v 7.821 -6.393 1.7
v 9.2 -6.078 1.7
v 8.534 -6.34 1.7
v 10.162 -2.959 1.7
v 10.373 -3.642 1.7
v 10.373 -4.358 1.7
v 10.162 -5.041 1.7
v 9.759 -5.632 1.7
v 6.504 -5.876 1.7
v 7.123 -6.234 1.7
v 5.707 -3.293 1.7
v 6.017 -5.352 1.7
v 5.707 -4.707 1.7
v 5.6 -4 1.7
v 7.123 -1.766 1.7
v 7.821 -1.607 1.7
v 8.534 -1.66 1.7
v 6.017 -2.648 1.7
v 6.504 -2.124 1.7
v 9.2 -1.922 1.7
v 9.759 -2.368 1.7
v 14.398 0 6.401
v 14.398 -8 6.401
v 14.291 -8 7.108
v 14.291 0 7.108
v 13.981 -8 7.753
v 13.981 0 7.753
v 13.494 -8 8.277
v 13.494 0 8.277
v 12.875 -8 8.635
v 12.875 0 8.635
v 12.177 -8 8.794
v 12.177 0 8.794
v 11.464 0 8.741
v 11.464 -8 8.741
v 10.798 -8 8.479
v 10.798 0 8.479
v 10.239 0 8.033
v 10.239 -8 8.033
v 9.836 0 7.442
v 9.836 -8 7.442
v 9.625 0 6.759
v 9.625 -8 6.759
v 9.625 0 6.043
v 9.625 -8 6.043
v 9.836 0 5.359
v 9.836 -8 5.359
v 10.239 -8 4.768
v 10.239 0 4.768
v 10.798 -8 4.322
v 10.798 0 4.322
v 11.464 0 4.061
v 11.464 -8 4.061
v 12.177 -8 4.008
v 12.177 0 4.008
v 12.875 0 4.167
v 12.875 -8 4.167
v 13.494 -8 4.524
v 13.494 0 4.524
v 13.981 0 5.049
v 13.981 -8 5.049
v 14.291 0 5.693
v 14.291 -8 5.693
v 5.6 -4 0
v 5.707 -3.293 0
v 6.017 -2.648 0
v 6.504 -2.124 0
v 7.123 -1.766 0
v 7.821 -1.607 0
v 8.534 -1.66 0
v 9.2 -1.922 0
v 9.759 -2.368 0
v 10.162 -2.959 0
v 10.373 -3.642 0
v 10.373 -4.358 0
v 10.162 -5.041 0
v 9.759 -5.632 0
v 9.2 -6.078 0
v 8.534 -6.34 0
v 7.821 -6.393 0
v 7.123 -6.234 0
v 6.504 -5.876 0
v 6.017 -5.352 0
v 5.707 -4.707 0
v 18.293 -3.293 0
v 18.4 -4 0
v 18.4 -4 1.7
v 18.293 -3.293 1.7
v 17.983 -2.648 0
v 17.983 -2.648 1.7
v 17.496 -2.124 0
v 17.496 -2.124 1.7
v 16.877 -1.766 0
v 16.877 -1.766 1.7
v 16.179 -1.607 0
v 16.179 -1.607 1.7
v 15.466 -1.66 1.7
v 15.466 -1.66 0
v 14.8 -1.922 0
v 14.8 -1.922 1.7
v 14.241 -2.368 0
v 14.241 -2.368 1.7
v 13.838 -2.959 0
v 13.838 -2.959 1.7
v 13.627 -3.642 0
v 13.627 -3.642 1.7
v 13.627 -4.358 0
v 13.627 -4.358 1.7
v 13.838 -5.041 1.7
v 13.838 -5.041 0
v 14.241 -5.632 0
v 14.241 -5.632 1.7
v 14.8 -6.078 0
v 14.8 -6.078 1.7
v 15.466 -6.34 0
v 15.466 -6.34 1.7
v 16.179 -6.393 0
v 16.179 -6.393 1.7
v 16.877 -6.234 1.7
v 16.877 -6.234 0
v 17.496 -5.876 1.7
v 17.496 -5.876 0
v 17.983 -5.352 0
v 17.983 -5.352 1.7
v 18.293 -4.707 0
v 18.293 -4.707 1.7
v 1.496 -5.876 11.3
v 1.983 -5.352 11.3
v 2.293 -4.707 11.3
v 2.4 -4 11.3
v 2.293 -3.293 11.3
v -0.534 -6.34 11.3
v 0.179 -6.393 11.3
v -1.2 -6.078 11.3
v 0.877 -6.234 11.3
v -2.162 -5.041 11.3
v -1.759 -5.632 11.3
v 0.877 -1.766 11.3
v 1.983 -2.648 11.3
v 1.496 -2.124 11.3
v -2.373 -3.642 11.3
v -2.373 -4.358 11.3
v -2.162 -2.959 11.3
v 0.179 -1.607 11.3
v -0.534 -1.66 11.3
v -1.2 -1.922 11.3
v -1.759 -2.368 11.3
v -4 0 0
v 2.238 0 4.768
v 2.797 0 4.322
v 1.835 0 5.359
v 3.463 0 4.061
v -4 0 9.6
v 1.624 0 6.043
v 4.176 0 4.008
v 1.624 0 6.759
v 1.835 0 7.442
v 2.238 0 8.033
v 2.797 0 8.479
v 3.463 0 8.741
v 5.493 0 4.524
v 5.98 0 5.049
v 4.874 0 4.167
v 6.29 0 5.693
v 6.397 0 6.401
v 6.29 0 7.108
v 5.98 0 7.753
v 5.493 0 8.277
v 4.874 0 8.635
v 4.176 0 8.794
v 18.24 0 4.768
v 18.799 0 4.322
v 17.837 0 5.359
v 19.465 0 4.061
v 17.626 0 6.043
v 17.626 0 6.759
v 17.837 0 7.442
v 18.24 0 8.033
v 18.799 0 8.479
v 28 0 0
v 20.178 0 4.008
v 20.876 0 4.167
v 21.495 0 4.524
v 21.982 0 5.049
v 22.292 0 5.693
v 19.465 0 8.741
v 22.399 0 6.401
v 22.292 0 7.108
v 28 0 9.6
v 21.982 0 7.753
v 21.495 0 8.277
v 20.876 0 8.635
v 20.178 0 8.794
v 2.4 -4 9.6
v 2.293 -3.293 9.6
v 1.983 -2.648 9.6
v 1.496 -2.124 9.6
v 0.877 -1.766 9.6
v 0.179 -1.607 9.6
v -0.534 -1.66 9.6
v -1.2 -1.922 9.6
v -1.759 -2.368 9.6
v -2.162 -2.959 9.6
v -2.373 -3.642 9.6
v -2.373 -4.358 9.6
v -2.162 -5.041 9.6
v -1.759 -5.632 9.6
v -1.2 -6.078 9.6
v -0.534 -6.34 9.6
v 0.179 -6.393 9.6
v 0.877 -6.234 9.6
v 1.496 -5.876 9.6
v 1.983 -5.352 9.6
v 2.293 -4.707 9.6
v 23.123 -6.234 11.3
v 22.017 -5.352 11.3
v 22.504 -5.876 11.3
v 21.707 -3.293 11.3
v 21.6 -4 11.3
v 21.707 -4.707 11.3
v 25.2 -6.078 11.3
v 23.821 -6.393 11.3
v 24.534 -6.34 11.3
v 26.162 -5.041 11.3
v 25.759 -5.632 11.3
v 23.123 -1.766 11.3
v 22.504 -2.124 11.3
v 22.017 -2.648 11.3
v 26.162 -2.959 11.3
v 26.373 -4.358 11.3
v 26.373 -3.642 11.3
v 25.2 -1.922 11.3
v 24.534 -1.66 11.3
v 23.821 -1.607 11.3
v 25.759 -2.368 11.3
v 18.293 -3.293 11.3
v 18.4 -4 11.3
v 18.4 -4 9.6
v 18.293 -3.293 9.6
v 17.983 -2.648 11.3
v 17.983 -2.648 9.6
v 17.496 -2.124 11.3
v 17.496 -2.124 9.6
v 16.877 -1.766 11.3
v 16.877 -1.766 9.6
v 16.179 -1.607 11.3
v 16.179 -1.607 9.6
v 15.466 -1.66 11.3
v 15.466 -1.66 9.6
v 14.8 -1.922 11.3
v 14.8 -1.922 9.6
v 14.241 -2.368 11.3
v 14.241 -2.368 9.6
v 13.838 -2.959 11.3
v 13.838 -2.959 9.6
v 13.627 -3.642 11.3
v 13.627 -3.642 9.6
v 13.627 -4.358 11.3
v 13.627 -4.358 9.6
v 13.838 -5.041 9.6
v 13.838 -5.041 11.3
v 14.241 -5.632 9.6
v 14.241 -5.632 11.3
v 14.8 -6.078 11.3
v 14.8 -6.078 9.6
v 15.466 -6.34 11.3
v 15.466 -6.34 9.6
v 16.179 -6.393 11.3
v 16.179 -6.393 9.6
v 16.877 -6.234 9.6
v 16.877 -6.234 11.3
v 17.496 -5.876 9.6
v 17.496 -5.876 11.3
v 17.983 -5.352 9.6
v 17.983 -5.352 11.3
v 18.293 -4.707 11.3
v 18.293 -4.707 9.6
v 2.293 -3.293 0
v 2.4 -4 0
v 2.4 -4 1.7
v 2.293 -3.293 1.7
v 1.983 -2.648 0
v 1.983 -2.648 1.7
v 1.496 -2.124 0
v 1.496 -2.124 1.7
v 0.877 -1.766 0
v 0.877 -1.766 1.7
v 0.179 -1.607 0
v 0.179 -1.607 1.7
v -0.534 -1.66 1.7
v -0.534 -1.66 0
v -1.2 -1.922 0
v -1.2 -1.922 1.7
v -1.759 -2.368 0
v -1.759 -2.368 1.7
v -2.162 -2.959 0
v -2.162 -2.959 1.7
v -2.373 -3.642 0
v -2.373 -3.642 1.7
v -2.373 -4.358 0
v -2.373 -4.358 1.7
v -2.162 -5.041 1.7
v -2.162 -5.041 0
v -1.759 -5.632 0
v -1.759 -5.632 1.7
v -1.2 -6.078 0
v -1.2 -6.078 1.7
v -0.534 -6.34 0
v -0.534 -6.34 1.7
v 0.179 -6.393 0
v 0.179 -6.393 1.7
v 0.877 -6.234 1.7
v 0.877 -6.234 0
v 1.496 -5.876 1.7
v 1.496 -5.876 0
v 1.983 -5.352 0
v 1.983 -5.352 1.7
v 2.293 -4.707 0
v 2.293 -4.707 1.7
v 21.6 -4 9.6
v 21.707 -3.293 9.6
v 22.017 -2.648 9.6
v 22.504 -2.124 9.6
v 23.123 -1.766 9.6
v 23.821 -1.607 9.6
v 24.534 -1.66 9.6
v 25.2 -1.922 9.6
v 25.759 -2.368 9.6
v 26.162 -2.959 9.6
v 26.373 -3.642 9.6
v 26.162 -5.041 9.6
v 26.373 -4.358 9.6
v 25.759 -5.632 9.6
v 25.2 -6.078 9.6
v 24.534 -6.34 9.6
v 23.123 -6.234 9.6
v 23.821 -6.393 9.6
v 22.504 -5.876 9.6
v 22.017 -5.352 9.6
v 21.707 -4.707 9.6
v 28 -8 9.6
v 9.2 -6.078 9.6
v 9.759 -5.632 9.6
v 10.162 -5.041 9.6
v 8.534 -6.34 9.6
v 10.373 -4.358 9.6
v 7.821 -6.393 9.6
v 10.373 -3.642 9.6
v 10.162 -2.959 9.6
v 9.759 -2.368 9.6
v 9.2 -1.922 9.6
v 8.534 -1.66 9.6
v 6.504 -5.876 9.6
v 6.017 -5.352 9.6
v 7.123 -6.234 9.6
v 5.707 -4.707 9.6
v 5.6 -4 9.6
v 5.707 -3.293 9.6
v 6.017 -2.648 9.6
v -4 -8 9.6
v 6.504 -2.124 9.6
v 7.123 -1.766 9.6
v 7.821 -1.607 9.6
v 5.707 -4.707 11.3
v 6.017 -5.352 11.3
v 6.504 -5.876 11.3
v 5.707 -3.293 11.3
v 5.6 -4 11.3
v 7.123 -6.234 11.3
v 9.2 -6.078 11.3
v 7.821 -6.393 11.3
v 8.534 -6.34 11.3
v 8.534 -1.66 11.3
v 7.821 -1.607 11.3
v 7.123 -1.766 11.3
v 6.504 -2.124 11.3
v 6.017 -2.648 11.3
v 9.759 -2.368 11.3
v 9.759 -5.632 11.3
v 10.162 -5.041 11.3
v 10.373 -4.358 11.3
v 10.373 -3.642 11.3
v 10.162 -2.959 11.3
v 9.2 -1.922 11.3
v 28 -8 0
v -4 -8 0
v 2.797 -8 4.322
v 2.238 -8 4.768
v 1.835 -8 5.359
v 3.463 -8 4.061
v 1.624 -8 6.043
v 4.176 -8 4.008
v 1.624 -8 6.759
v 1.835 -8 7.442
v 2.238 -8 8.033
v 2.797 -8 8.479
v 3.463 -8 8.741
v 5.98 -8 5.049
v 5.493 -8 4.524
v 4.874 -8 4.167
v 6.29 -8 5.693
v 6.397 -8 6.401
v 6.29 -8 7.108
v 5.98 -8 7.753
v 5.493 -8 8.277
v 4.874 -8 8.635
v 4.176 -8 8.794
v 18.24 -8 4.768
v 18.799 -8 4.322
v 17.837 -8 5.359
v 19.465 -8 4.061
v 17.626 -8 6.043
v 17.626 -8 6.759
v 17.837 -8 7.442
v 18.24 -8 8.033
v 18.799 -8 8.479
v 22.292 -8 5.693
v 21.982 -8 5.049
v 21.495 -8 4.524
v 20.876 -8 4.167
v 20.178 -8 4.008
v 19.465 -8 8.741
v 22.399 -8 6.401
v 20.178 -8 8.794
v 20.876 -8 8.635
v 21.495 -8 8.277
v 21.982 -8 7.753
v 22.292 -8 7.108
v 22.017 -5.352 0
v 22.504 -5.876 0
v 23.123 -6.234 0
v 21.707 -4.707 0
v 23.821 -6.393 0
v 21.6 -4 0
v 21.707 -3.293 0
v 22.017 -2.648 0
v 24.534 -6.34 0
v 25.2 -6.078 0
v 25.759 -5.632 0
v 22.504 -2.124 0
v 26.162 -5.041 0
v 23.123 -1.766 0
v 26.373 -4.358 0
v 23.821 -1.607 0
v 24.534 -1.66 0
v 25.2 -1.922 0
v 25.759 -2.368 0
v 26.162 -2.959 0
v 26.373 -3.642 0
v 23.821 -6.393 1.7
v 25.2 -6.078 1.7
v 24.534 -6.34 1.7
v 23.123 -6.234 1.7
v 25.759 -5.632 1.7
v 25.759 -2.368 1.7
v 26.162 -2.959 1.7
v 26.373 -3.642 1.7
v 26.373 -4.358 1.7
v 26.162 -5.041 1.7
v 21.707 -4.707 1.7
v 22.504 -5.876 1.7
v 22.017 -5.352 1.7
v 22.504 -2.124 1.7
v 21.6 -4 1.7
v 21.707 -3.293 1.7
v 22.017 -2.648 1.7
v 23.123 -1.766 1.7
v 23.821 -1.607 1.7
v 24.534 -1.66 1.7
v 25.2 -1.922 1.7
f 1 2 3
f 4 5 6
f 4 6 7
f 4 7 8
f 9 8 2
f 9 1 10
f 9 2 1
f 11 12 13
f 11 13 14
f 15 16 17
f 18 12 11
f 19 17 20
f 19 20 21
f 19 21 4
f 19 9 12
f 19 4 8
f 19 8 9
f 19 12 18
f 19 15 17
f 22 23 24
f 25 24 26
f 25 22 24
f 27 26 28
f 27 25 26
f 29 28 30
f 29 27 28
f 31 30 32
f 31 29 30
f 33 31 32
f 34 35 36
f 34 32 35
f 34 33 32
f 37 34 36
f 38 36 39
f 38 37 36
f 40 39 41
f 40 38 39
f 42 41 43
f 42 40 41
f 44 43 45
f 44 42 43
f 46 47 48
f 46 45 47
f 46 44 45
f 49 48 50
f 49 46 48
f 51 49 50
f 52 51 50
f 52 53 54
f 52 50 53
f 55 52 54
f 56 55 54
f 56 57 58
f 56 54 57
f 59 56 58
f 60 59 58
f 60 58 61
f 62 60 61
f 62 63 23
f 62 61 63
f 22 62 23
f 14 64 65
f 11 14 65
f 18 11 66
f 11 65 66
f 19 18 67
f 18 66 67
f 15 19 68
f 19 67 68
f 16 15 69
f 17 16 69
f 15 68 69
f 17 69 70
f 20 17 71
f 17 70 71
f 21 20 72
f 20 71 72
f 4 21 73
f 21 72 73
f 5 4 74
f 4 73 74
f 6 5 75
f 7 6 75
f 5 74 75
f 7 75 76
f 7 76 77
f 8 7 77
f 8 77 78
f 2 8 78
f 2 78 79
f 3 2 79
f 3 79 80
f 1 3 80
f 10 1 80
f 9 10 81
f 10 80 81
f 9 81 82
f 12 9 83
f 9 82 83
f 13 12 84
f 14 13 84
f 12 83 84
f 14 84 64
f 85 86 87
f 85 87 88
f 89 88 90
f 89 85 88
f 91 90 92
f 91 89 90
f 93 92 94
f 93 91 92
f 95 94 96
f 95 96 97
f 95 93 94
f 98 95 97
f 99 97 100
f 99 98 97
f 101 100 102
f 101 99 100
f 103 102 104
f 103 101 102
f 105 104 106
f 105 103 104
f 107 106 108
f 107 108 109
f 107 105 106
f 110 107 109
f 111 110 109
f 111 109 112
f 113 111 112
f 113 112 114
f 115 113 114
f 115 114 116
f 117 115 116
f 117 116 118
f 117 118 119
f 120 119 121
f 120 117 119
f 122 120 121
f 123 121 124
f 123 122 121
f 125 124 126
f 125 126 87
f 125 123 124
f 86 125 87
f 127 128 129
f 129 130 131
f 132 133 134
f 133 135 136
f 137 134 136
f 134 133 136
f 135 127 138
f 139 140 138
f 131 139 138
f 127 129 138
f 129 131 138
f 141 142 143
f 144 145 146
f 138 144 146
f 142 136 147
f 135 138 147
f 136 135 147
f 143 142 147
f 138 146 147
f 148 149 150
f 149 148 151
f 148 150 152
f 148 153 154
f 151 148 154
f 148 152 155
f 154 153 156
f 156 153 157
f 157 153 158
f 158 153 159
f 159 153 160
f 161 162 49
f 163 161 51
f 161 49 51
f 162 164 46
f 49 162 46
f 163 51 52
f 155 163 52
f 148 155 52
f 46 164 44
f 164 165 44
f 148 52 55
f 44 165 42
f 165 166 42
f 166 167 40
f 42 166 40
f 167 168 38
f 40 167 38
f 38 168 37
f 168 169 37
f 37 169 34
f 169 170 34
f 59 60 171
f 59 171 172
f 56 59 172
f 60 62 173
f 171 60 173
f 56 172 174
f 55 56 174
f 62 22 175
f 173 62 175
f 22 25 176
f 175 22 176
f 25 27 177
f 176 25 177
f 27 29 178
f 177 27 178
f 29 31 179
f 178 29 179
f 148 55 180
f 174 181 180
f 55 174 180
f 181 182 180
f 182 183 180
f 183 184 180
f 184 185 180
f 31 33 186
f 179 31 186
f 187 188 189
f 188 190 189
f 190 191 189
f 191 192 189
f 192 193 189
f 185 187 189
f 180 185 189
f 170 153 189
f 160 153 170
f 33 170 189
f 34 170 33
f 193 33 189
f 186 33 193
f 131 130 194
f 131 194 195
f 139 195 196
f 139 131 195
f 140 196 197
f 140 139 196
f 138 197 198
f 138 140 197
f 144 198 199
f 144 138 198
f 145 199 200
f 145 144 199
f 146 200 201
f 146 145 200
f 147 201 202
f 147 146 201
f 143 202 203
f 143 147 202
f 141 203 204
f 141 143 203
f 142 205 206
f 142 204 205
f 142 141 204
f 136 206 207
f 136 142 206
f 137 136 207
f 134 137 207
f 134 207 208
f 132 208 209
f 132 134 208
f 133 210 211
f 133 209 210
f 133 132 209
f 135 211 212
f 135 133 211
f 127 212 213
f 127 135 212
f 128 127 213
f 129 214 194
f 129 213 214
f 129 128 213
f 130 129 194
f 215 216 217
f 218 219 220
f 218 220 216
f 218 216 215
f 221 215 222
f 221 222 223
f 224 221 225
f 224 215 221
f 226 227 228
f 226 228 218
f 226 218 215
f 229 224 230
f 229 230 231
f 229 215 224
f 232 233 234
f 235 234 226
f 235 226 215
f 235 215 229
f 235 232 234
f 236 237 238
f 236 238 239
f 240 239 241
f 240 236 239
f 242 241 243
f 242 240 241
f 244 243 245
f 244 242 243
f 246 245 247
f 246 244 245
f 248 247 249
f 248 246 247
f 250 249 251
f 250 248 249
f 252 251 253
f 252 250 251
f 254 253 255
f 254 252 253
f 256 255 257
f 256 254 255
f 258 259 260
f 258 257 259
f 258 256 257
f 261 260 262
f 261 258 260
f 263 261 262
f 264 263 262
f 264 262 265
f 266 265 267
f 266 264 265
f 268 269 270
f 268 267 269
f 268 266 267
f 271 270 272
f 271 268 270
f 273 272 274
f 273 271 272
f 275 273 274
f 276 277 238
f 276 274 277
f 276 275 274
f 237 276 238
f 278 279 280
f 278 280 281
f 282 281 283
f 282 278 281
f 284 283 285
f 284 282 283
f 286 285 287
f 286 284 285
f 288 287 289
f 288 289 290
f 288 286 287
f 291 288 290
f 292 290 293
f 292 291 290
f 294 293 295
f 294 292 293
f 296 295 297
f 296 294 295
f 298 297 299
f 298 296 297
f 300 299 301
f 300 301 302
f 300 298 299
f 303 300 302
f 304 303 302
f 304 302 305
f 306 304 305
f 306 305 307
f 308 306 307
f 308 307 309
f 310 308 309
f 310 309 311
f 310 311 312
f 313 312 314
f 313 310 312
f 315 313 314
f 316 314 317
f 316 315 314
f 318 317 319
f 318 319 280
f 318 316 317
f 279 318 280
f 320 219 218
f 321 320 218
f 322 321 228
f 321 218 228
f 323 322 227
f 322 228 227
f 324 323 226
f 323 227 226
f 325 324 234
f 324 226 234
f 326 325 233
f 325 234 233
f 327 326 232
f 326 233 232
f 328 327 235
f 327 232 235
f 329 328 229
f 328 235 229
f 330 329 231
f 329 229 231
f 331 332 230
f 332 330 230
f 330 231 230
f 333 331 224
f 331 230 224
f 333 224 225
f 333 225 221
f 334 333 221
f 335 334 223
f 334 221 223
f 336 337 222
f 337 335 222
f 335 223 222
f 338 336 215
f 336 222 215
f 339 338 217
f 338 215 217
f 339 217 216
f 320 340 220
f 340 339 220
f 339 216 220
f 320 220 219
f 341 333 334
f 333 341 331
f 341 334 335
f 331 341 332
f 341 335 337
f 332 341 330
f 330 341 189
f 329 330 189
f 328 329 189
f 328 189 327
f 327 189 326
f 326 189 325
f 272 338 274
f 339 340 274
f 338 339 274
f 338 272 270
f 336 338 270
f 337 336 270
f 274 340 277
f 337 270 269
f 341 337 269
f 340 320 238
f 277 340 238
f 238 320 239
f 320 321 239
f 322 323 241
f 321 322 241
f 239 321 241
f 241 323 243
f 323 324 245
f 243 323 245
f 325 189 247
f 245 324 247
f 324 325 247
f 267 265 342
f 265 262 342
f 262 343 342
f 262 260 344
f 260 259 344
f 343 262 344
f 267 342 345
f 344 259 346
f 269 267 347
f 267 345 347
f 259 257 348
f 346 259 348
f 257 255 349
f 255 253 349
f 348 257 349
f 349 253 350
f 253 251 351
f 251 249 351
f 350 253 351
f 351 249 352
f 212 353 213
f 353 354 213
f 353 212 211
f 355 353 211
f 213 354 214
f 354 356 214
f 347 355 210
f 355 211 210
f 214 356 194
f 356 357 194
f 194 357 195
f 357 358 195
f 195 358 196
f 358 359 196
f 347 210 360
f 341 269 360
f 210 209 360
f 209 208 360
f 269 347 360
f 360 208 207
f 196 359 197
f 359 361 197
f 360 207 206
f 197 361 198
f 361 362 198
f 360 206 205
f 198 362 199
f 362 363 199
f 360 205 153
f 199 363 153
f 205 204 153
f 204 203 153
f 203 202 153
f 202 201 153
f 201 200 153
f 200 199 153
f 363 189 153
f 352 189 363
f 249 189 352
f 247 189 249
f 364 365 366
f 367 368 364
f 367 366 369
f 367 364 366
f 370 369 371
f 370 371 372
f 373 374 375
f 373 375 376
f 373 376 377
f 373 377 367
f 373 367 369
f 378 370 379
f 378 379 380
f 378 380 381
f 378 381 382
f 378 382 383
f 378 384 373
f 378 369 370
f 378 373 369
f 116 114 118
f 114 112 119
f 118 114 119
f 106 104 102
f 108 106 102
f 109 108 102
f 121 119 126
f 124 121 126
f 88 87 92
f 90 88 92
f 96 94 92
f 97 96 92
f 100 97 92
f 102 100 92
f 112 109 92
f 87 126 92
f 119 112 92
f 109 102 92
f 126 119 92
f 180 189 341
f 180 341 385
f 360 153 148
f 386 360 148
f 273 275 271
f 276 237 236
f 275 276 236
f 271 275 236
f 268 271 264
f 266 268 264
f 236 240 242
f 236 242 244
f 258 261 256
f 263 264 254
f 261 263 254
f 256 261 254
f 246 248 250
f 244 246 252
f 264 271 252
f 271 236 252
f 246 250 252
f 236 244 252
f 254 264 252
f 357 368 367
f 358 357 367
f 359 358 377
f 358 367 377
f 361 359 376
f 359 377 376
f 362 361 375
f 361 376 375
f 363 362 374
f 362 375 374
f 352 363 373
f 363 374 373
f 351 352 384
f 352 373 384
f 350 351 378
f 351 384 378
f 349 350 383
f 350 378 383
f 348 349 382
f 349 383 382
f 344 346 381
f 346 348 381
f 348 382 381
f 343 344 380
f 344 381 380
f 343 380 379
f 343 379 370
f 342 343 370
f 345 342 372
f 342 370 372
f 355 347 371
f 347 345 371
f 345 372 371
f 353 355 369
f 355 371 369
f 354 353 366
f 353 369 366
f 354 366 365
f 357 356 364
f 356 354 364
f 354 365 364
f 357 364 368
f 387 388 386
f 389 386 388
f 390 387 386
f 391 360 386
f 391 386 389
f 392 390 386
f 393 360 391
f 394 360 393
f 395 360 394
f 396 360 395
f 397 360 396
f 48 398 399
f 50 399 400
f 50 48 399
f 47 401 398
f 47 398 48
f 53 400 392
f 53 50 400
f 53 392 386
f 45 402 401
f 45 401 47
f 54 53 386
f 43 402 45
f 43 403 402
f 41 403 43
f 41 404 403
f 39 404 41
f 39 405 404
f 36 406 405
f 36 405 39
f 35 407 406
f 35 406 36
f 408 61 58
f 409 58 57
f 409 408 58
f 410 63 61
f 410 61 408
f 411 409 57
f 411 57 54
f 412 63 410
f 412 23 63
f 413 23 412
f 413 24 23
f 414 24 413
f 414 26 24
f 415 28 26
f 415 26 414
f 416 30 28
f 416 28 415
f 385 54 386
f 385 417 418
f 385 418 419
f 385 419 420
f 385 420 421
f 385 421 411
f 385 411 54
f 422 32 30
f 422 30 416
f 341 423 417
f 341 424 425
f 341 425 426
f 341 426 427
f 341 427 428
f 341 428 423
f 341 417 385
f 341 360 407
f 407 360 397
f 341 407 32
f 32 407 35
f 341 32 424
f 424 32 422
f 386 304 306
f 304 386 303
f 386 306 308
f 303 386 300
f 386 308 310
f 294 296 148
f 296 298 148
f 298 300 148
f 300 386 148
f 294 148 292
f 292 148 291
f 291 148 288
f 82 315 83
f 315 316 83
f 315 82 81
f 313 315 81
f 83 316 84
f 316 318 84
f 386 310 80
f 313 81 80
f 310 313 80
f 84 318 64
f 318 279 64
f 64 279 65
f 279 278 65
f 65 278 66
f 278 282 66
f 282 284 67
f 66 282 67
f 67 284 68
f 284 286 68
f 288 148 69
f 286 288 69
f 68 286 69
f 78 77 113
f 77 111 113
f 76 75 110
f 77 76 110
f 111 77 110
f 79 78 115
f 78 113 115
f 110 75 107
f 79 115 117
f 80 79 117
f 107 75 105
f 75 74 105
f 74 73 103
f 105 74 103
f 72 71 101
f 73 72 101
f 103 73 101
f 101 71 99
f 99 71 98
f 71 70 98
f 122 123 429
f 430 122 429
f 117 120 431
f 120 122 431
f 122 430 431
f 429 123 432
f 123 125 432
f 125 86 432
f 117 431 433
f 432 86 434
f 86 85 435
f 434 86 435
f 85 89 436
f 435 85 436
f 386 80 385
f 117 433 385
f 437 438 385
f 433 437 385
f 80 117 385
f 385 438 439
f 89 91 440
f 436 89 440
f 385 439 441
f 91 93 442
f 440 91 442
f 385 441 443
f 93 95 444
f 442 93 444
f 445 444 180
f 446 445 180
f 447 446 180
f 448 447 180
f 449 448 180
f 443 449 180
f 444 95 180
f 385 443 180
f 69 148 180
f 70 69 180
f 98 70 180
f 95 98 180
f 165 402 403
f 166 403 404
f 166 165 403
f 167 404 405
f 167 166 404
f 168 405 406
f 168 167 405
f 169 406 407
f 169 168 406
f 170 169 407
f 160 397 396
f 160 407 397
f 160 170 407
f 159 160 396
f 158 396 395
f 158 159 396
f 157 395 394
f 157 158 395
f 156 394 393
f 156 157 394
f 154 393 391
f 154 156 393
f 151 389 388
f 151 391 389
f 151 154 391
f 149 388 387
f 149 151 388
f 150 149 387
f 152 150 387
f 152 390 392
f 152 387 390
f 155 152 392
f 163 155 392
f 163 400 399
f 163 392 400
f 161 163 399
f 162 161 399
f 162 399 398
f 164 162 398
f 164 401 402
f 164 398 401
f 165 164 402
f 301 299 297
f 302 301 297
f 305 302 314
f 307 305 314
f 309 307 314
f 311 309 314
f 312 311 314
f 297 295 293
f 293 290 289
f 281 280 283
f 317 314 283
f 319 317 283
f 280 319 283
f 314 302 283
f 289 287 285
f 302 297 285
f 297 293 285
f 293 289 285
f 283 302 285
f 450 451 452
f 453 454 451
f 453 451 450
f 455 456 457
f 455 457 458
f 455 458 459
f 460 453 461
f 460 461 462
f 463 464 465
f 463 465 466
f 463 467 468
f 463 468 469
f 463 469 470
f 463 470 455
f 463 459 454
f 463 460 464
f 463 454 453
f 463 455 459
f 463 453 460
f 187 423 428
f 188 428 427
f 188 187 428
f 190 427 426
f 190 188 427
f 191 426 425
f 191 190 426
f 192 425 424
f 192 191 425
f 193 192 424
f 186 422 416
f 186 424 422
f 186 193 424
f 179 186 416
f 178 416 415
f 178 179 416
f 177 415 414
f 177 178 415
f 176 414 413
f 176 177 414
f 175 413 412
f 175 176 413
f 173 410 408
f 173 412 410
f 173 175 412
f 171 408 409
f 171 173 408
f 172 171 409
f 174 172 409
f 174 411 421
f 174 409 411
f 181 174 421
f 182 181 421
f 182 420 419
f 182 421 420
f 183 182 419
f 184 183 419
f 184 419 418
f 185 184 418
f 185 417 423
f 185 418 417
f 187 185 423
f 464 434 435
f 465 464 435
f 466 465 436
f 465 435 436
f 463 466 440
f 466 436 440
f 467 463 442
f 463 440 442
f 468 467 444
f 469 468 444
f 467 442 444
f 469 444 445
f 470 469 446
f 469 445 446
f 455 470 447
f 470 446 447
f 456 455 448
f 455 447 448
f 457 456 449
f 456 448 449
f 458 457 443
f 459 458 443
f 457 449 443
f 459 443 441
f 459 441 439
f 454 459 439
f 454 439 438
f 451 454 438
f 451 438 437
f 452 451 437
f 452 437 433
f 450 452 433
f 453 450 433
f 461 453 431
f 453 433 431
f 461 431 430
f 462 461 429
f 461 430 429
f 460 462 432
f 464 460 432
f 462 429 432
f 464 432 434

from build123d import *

# Parameters (mm, degrees)
F1_DEPTH  = 8
F3_W      = 8
F3_H      = 8
F3_R      = 2.4
F4_DEPTH  = 1.7
F5_R      = 2.4
F6_DEPTH  = 1.7
F11_R     = 2.4
F12_DEPTH = 25.4


with BuildPart() as f1:
    # F0 (on Front) → F1 (new body)
    with BuildSketch(Plane.XZ):
        Polygon((-2.4, 9.6), (-4, 9.6), (-4, 0), (4, 0), (4, 9.6), (2.4, 9.6), (2.4, 11.3), (-2.4, 11.3), align=None)
    extrude(amount=F1_DEPTH)

    # F3 (on plane+point) → F4 (cut, through all)
    with BuildSketch(Plane.XY.offset(11.3)):
        with Locations((0, -4)):
            Rectangle(F3_W, F3_H)
        with Locations((0, -4)):
            Circle(F3_R, mode=Mode.SUBTRACT)
    extrude(amount=-F4_DEPTH, mode=Mode.SUBTRACT)

    # F5 (on Top) → F6 (cut)
    with BuildSketch(Plane.XY):
        with Locations((0, -4)):
            Circle(F5_R)
    extrude(amount=F6_DEPTH, mode=Mode.SUBTRACT)

    # F8: F1 across plane


with BuildPart() as f1_1:
    add(f1.part)
    add(f1.part.mirror(Plane.YZ.offset(4)))

    # F10: F1 across plane


with BuildPart() as f1_2:
    add(f1_1.part)
    add(f1_1.part.mirror(Plane.YZ.offset(12)))

    # F11 (on Front) → F12 (cut)
    with BuildSketch(Plane.XZ):
        with Locations((19.999, 6.4008)):
            Circle(F11_R)
        with Locations((11.998, 6.4008)):
            Circle(F11_R)
        with Locations((3.997, 6.4008)):
            Circle(F11_R)
    extrude(amount=F12_DEPTH, mode=Mode.SUBTRACT)


solid = f1_2.part
